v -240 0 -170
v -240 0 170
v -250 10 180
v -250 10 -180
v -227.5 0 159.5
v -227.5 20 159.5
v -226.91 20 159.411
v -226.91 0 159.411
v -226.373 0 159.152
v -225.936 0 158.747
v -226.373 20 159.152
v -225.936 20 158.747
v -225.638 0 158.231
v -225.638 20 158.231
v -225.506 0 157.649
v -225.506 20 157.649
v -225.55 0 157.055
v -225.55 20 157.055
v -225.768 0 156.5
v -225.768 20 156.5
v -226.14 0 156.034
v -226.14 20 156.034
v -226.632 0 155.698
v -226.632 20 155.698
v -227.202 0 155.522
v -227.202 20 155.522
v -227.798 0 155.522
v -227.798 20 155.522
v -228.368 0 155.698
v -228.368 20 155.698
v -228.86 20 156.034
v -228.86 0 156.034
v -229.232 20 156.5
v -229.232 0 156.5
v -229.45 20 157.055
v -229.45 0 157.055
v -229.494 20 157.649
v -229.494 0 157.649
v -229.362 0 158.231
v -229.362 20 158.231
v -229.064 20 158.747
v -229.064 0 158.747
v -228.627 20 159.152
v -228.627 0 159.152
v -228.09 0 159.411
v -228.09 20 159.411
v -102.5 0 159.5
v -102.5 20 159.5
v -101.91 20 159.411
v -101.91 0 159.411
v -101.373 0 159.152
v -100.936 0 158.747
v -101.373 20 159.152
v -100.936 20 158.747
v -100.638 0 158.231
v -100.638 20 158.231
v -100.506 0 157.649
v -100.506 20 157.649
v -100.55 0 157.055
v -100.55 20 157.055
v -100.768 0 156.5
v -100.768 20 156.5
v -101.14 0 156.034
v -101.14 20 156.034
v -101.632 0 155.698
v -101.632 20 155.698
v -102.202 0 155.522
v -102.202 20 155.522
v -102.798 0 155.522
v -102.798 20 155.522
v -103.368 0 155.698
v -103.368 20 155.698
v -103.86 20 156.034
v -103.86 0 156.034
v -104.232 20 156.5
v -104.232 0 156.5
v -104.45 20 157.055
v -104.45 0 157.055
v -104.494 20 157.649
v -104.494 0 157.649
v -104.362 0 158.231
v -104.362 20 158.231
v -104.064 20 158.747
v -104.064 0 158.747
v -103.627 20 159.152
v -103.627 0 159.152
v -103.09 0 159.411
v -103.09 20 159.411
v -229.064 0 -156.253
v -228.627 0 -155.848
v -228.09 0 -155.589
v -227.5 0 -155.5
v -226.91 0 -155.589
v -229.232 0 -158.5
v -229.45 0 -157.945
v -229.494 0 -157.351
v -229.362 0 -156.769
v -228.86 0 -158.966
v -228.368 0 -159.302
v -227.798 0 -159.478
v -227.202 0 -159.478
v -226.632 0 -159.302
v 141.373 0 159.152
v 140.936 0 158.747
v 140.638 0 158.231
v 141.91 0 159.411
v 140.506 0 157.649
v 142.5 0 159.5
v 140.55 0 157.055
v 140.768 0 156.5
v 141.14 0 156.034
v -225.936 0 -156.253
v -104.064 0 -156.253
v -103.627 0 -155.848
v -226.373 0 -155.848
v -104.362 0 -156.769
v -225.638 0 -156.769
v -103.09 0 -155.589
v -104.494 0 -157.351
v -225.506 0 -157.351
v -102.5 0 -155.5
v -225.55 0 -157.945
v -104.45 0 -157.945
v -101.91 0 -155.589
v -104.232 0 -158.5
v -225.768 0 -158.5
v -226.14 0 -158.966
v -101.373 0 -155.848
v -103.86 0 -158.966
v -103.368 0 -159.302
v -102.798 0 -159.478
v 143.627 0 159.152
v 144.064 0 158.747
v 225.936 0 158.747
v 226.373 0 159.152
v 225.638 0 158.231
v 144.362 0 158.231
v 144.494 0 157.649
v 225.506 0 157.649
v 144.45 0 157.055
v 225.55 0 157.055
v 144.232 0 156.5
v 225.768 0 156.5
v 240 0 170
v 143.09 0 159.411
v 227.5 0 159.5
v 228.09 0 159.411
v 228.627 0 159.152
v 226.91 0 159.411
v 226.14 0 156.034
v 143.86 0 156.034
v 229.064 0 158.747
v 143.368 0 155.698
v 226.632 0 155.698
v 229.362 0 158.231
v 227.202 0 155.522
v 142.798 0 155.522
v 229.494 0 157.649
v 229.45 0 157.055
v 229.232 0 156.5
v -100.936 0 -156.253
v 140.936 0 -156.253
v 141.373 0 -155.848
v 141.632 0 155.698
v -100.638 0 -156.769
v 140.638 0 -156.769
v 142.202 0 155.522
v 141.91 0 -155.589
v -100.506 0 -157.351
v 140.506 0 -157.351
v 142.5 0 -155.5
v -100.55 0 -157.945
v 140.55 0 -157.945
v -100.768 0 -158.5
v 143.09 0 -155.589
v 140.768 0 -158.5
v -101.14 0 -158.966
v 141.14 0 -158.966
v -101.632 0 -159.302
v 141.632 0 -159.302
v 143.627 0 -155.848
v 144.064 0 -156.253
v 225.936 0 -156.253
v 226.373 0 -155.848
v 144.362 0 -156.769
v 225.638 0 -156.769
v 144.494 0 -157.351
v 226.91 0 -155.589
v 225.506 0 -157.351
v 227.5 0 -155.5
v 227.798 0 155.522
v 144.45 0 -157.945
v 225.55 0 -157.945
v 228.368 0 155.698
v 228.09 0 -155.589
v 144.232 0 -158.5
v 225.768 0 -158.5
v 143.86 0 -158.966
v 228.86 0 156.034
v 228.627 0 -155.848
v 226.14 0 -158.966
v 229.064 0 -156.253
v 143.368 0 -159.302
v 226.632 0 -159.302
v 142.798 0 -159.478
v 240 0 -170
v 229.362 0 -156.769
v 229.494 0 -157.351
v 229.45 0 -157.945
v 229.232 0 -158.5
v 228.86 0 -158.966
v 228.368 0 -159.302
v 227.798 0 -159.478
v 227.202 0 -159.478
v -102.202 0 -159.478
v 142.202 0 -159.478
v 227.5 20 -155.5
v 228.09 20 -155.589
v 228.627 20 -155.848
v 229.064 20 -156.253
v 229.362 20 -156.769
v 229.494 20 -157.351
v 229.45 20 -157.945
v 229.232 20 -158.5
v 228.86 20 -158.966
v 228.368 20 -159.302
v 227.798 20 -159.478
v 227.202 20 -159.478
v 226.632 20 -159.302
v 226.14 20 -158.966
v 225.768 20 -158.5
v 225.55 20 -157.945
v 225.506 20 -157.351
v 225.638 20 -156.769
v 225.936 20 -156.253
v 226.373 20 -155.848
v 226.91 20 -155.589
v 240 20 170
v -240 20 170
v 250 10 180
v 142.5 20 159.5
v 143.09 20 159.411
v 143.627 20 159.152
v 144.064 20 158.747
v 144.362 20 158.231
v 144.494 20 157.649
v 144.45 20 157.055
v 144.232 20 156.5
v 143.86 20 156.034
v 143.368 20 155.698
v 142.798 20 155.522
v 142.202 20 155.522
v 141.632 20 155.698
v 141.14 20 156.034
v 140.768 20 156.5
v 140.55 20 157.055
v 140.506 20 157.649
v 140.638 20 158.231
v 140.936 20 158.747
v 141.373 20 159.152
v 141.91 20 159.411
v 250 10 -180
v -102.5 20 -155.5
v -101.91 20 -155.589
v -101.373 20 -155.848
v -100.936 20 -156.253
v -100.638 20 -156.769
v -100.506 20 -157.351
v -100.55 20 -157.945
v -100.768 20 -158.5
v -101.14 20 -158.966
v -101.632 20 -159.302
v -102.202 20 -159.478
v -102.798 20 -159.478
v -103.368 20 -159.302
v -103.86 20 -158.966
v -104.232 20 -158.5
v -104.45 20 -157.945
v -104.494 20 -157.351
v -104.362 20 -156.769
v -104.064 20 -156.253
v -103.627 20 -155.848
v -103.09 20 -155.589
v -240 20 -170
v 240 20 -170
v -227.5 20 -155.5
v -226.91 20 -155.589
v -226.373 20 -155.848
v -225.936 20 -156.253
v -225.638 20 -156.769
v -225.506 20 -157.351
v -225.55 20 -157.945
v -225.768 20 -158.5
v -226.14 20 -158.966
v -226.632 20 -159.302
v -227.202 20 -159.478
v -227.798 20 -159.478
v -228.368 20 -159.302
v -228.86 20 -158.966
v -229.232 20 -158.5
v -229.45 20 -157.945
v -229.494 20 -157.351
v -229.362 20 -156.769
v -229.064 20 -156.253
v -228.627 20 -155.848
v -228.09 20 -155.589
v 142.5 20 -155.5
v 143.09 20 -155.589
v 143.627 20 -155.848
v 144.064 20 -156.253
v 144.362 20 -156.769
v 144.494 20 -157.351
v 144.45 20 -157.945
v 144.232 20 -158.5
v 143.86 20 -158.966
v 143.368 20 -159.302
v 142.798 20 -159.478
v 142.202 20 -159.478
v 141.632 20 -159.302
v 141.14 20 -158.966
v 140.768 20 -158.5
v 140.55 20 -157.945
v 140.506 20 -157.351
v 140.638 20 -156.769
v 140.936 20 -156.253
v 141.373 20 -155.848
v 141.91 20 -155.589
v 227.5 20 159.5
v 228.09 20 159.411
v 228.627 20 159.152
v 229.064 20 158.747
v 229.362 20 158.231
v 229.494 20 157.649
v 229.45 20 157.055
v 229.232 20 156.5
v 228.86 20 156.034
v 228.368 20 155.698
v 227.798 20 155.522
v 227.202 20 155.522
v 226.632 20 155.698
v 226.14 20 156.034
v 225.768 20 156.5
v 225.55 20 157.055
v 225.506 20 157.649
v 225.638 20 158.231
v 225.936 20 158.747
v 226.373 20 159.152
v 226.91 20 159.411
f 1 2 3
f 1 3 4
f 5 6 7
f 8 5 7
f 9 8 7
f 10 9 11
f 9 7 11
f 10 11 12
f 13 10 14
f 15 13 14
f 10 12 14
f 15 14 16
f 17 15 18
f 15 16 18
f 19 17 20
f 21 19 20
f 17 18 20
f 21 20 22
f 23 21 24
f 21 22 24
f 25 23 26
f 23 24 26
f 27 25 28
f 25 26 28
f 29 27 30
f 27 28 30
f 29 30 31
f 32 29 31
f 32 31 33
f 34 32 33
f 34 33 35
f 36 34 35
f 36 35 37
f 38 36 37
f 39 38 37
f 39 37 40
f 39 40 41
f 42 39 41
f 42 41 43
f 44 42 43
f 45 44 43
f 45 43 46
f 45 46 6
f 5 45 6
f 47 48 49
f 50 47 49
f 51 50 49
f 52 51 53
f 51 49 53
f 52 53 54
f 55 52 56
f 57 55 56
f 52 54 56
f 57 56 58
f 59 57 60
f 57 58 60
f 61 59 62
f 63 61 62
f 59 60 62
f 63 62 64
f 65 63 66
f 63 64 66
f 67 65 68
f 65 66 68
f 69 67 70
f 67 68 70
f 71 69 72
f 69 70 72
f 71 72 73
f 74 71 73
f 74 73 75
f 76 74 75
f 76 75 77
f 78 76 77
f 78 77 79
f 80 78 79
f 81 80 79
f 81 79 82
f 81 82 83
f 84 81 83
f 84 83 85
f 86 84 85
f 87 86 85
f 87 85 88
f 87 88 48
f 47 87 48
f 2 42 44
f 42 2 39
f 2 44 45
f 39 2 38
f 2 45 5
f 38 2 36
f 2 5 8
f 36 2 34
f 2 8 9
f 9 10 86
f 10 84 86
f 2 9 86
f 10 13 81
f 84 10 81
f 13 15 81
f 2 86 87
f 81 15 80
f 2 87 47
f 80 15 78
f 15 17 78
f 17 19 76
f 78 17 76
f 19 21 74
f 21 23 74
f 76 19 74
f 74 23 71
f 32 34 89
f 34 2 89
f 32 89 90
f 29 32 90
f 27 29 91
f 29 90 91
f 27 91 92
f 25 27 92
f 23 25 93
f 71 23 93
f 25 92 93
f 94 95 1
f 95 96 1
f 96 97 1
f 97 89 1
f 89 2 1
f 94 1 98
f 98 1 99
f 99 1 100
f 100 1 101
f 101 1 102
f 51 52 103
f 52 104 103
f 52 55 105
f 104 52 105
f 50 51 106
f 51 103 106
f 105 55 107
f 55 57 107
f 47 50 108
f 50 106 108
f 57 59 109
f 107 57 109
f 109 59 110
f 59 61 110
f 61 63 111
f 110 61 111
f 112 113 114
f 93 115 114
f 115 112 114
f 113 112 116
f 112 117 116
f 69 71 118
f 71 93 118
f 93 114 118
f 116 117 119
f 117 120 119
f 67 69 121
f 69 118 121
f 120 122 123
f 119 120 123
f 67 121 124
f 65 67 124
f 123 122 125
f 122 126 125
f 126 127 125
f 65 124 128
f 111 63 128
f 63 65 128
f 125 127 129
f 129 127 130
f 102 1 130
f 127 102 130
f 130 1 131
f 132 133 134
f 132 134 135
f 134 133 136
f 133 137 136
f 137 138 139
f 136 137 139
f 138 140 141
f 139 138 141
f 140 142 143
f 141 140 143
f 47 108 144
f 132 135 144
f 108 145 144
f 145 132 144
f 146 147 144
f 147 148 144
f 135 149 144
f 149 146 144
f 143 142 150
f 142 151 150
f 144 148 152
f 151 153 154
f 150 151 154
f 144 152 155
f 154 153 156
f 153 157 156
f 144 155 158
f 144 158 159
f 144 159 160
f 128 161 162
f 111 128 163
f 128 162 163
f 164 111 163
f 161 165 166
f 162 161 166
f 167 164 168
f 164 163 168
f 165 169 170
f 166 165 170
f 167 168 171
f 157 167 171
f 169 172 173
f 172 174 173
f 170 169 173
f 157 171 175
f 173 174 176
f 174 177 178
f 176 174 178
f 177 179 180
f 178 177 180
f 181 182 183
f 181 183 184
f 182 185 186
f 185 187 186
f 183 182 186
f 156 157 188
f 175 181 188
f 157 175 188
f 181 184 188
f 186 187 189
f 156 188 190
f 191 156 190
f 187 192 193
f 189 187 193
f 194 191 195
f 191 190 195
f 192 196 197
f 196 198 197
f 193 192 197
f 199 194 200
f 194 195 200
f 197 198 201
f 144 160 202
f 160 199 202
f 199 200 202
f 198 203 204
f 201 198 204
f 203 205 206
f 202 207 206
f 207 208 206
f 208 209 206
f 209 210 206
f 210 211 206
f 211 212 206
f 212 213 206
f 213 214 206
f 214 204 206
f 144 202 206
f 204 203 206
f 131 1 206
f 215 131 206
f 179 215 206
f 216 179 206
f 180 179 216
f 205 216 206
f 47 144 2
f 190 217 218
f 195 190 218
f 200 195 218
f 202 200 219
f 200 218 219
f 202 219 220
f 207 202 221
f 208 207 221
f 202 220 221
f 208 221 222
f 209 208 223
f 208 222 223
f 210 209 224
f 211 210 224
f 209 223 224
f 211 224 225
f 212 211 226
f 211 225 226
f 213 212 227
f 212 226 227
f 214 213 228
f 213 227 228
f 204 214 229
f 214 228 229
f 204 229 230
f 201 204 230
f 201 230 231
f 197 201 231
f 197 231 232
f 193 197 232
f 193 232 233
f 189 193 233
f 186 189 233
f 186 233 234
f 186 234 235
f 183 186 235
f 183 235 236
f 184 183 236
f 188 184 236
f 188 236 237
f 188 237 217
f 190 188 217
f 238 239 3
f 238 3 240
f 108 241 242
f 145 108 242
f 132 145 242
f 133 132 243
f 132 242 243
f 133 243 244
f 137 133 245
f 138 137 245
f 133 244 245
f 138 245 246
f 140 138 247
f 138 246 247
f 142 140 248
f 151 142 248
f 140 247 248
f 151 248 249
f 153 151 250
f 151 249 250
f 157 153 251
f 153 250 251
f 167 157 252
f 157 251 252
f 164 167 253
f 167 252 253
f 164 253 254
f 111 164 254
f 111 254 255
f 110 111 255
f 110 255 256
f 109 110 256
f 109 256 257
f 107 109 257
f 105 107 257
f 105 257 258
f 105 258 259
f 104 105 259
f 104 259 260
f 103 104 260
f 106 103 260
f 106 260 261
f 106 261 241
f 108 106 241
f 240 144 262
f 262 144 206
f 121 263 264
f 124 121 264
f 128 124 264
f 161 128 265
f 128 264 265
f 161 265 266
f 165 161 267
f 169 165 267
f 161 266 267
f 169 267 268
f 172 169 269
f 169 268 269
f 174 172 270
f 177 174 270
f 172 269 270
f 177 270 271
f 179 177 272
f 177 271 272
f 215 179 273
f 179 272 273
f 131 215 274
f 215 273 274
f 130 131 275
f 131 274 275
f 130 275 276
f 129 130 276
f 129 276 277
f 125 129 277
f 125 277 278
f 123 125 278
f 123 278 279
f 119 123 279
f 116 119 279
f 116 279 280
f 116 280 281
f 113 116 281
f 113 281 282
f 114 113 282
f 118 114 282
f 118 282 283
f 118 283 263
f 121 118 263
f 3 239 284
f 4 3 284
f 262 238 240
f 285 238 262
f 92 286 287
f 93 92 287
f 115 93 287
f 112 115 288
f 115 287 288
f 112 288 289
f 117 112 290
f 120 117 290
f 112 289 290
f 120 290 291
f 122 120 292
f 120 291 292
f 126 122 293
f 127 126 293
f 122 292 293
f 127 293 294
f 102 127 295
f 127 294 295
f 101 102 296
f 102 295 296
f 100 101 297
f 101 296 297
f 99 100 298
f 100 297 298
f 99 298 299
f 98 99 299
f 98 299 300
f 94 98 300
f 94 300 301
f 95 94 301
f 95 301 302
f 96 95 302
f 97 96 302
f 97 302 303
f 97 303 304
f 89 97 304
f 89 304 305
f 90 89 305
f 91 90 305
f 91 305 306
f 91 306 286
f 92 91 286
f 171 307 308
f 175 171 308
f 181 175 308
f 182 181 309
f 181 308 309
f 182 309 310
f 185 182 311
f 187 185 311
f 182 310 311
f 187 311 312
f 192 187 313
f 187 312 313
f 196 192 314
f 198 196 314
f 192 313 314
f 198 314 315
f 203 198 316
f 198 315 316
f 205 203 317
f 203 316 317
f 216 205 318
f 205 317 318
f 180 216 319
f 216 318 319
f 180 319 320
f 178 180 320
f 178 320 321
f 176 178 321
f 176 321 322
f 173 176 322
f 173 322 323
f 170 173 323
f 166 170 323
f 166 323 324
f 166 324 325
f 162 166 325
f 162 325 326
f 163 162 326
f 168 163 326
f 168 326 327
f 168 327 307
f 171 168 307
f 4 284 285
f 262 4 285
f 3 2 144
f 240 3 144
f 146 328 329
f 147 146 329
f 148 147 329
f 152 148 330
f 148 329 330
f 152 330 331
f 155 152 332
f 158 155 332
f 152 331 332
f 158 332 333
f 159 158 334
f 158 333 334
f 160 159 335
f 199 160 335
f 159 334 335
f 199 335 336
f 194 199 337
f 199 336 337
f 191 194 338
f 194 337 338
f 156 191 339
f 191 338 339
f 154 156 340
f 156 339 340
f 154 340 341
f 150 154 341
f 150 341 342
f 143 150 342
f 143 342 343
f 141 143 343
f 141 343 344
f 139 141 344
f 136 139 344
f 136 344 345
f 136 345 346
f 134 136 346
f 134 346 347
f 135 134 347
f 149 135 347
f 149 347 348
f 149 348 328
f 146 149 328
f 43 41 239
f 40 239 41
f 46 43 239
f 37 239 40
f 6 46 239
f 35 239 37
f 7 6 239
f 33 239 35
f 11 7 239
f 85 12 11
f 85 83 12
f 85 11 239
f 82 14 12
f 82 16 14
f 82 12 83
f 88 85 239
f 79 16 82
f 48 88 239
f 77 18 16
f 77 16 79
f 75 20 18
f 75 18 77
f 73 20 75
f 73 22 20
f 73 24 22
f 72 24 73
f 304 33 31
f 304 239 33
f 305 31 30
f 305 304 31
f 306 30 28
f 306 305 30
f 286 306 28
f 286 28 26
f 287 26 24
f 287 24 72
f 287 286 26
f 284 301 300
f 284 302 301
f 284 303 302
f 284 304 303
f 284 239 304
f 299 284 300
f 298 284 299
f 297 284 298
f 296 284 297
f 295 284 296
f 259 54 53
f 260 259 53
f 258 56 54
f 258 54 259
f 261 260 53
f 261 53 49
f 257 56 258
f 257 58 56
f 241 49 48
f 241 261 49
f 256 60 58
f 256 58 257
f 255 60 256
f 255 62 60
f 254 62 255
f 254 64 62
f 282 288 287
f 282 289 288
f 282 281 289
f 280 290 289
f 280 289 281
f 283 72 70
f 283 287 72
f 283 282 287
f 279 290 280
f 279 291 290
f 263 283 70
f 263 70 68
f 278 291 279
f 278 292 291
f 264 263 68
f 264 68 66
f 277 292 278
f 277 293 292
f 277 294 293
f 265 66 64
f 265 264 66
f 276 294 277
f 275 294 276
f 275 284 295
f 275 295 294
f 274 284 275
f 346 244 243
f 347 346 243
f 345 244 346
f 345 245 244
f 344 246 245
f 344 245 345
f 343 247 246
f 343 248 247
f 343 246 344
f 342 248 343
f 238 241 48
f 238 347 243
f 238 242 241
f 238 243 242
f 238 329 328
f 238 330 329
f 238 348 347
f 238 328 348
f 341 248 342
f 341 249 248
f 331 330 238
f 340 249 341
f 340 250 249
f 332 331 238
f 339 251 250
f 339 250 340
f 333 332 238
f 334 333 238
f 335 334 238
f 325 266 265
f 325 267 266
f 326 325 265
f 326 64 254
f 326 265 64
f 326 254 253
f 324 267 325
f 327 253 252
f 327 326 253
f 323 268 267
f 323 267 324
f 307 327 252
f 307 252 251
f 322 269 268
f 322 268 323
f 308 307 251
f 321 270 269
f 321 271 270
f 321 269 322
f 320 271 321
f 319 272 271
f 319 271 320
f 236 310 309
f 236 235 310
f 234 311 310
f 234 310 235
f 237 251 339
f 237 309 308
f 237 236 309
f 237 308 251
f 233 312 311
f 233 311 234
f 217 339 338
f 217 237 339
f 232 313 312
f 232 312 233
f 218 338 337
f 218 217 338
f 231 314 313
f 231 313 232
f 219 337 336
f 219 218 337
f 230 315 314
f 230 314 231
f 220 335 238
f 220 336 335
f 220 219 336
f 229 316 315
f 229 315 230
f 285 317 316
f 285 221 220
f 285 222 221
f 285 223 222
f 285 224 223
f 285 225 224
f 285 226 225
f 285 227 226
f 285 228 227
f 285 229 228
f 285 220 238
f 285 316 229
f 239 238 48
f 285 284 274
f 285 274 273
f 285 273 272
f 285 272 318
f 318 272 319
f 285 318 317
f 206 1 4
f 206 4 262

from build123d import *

# Parameters (mm, degrees)
SKIZZE1_W                       = 500
SKIZZE1_H                       = 360
AUFSATZ_LINEAR_AUSTRAGEN1_DEPTH = 20
FASE1_SIZE                      = 10
SKIZZE3_R                       = 2
SCHNITT_LINEAR_AUSTRAGEN1_DEPTH = 309.706980809


with BuildPart() as part:
    # Skizze1 → Aufsatz-Linear austragen1 (new body)
    with BuildSketch(Plane(origin=(0, 0, 0), x_dir=(1, 0, 0), z_dir=(0, 1, 0))):
        Rectangle(SKIZZE1_W, SKIZZE1_H)
    extrude(amount=AUFSATZ_LINEAR_AUSTRAGEN1_DEPTH)

    # Fase1
    fase1_edges = [part.edges().sort_by_distance(p)[0] for p in [
        (0, 20, 180),
        (-250, 20, 0),
        (0, 20, -180),
        (250, 20, 0),
        (0, 0, -180),
        (-250, 0, 0),
        (0, 0, 180),
        (250, 0, 0),
    ]]
    chamfer(fase1_edges, length=FASE1_SIZE - 0.0001)  # a hair under: the kernel refuses the full size

    # Skizze3 → Schnitt-Linear austragen1 (cut, through all)
    with BuildSketch(Plane(origin=(0, 20, 0), x_dir=(1, 0, 0), z_dir=(0, 1, 0))):
        with Locations(Location((-227.5, 157.5, 0), (0, 0, 270))):
            Circle(SKIZZE3_R)
        with Locations(Location((-102.5, 157.5, 0), (0, 0, 270))):
            Circle(SKIZZE3_R)
        with Locations(Location((142.5, 157.5, 0), (0, 0, 270))):
            Circle(SKIZZE3_R)
        with Locations(Location((227.5, 157.5, 0), (0, 0, 270))):
            Circle(SKIZZE3_R)
        with Locations(Location((227.5, -157.5, 0), (0, 0, 270))):
            Circle(SKIZZE3_R)
        with Locations(Location((142.5, -157.5, 0), (0, 0, 270))):
            Circle(SKIZZE3_R)
        with Locations(Location((-102.5, -157.5, 0), (0, 0, 270))):
            Circle(SKIZZE3_R)
        with Locations(Location((-227.5, -157.5, 0), (0, 0, 270))):
            Circle(SKIZZE3_R)
    extrude(amount=-SCHNITT_LINEAR_AUSTRAGEN1_DEPTH, mode=Mode.SUBTRACT)


solid = part.part
